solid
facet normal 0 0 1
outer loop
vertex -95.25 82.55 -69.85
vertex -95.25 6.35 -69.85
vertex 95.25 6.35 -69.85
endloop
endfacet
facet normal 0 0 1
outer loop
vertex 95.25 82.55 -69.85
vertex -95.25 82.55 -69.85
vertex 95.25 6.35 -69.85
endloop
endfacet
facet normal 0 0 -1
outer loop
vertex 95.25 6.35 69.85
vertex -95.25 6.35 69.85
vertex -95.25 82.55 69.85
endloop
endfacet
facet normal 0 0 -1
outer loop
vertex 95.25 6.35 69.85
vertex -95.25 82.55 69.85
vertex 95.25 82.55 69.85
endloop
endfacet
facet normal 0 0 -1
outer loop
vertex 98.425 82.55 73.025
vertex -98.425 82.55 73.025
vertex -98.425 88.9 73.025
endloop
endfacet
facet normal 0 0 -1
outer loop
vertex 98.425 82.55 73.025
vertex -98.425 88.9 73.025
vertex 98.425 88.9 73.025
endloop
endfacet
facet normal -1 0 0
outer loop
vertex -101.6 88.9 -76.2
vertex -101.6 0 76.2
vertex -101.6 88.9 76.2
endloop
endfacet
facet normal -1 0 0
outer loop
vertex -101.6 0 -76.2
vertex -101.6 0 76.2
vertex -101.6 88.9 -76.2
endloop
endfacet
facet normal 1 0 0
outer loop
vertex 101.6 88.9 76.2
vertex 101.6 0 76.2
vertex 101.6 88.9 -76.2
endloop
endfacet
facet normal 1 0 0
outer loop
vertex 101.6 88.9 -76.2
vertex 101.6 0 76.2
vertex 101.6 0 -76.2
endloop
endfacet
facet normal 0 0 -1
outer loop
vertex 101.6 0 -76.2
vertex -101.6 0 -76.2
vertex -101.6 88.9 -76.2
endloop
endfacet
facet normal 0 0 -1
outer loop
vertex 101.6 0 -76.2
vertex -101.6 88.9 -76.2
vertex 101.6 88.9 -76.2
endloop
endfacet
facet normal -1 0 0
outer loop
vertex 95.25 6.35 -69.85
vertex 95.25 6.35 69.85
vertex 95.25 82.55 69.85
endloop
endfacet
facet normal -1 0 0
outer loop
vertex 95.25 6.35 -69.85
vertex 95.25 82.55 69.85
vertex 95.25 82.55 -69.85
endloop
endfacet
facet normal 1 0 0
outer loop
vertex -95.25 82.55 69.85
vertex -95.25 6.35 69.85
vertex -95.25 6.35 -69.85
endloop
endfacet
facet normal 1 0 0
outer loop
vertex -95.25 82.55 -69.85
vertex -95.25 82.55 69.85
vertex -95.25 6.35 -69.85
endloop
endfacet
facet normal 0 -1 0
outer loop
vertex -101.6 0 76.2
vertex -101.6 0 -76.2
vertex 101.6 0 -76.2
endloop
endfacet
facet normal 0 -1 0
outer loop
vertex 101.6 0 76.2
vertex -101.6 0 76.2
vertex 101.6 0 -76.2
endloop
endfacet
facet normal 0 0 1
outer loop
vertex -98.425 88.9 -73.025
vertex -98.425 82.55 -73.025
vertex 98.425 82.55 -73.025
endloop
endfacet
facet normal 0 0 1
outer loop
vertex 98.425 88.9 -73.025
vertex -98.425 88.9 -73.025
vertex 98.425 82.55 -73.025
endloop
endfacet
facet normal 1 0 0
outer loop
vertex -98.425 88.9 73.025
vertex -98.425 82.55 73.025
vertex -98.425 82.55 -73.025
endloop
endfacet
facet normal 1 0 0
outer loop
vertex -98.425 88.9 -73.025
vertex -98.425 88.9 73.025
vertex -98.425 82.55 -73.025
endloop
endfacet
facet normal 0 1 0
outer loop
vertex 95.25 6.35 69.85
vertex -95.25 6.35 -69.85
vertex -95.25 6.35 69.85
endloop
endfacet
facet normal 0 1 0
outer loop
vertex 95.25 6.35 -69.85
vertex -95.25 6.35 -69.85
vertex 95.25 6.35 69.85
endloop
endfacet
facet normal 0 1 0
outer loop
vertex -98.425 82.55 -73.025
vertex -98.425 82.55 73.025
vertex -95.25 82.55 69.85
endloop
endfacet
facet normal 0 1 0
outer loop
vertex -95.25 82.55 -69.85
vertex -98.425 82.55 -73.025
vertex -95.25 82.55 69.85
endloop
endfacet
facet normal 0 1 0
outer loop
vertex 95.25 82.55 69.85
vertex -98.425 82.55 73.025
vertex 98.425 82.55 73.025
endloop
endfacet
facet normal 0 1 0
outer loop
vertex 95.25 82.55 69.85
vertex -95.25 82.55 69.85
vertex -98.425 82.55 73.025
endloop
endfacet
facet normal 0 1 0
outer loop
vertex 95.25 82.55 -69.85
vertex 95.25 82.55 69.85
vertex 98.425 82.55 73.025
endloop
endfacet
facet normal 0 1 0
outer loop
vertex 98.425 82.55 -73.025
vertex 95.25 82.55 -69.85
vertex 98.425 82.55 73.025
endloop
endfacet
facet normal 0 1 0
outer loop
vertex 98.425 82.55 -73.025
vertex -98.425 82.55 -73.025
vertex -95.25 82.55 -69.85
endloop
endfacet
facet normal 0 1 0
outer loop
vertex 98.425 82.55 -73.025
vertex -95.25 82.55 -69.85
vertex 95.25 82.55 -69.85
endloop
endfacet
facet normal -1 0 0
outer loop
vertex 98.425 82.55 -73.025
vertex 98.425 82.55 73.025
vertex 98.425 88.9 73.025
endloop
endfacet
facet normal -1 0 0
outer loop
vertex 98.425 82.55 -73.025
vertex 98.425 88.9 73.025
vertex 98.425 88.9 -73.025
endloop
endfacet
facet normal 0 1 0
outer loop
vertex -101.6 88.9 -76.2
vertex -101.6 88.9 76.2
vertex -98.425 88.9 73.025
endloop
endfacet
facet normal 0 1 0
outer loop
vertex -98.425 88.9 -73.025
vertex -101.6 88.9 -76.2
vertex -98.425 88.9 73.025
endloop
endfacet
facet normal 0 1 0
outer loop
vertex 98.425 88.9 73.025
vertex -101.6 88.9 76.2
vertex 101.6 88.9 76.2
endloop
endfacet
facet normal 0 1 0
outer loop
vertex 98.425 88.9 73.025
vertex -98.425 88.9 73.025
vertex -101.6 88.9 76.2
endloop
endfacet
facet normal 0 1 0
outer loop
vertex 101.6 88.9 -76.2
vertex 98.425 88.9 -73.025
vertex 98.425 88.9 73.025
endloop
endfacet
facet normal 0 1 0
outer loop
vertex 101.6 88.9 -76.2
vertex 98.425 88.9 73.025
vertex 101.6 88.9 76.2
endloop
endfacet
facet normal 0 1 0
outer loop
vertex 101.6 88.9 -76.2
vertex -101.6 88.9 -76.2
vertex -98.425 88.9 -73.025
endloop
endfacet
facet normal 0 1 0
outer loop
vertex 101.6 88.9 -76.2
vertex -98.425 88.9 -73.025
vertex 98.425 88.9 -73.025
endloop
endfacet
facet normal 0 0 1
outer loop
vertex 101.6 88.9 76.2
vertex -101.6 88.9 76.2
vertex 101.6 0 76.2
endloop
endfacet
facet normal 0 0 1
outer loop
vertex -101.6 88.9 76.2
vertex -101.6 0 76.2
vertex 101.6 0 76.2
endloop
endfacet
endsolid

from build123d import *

# Parameters (mm, degrees)
SKETCH1_W           = 203.2
SKETCH1_H           = 152.4
BOSS_EXTRUDE1_DEPTH = 6.35
SKETCH2_W           = 203.2
SKETCH2_H           = 152.4
SKETCH2_W_2         = 190.5
SKETCH2_H_2         = 139.7
BOSS_EXTRUDE2_DEPTH = 76.2
SKETCH3_W           = 203.2
SKETCH3_H           = 152.4
SKETCH3_W_2         = 196.85
SKETCH3_H_2         = 146.05
BOSS_EXTRUDE3_DEPTH = 6.35


with BuildPart() as part:
    # Sketch1 → Boss-Extrude1 (new body)
    with BuildSketch(Plane(origin=(0, 0, 0), x_dir=(1, 0, 0), z_dir=(0, 1, 0))):
        Rectangle(SKETCH1_W, SKETCH1_H)
    extrude(amount=BOSS_EXTRUDE1_DEPTH)

    # Sketch2 → Boss-Extrude2 (add)
    with BuildSketch(Plane(origin=(0, 6.35, 0), x_dir=(1, 0, 0), z_dir=(0, 1, 0))):
        Rectangle(SKETCH2_W, SKETCH2_H)
        Rectangle(SKETCH2_W_2, SKETCH2_H_2, mode=Mode.SUBTRACT)
    extrude(amount=BOSS_EXTRUDE2_DEPTH)

    # Sketch3 → Boss-Extrude3 (add)
    with BuildSketch(Plane(origin=(0, 82.55, 0), x_dir=(1, 0, 0), z_dir=(0, 1, 0))):
        Rectangle(SKETCH3_W, SKETCH3_H)
        Rectangle(SKETCH3_W_2, SKETCH3_H_2, mode=Mode.SUBTRACT)
    extrude(amount=BOSS_EXTRUDE3_DEPTH)


solid = part.part
